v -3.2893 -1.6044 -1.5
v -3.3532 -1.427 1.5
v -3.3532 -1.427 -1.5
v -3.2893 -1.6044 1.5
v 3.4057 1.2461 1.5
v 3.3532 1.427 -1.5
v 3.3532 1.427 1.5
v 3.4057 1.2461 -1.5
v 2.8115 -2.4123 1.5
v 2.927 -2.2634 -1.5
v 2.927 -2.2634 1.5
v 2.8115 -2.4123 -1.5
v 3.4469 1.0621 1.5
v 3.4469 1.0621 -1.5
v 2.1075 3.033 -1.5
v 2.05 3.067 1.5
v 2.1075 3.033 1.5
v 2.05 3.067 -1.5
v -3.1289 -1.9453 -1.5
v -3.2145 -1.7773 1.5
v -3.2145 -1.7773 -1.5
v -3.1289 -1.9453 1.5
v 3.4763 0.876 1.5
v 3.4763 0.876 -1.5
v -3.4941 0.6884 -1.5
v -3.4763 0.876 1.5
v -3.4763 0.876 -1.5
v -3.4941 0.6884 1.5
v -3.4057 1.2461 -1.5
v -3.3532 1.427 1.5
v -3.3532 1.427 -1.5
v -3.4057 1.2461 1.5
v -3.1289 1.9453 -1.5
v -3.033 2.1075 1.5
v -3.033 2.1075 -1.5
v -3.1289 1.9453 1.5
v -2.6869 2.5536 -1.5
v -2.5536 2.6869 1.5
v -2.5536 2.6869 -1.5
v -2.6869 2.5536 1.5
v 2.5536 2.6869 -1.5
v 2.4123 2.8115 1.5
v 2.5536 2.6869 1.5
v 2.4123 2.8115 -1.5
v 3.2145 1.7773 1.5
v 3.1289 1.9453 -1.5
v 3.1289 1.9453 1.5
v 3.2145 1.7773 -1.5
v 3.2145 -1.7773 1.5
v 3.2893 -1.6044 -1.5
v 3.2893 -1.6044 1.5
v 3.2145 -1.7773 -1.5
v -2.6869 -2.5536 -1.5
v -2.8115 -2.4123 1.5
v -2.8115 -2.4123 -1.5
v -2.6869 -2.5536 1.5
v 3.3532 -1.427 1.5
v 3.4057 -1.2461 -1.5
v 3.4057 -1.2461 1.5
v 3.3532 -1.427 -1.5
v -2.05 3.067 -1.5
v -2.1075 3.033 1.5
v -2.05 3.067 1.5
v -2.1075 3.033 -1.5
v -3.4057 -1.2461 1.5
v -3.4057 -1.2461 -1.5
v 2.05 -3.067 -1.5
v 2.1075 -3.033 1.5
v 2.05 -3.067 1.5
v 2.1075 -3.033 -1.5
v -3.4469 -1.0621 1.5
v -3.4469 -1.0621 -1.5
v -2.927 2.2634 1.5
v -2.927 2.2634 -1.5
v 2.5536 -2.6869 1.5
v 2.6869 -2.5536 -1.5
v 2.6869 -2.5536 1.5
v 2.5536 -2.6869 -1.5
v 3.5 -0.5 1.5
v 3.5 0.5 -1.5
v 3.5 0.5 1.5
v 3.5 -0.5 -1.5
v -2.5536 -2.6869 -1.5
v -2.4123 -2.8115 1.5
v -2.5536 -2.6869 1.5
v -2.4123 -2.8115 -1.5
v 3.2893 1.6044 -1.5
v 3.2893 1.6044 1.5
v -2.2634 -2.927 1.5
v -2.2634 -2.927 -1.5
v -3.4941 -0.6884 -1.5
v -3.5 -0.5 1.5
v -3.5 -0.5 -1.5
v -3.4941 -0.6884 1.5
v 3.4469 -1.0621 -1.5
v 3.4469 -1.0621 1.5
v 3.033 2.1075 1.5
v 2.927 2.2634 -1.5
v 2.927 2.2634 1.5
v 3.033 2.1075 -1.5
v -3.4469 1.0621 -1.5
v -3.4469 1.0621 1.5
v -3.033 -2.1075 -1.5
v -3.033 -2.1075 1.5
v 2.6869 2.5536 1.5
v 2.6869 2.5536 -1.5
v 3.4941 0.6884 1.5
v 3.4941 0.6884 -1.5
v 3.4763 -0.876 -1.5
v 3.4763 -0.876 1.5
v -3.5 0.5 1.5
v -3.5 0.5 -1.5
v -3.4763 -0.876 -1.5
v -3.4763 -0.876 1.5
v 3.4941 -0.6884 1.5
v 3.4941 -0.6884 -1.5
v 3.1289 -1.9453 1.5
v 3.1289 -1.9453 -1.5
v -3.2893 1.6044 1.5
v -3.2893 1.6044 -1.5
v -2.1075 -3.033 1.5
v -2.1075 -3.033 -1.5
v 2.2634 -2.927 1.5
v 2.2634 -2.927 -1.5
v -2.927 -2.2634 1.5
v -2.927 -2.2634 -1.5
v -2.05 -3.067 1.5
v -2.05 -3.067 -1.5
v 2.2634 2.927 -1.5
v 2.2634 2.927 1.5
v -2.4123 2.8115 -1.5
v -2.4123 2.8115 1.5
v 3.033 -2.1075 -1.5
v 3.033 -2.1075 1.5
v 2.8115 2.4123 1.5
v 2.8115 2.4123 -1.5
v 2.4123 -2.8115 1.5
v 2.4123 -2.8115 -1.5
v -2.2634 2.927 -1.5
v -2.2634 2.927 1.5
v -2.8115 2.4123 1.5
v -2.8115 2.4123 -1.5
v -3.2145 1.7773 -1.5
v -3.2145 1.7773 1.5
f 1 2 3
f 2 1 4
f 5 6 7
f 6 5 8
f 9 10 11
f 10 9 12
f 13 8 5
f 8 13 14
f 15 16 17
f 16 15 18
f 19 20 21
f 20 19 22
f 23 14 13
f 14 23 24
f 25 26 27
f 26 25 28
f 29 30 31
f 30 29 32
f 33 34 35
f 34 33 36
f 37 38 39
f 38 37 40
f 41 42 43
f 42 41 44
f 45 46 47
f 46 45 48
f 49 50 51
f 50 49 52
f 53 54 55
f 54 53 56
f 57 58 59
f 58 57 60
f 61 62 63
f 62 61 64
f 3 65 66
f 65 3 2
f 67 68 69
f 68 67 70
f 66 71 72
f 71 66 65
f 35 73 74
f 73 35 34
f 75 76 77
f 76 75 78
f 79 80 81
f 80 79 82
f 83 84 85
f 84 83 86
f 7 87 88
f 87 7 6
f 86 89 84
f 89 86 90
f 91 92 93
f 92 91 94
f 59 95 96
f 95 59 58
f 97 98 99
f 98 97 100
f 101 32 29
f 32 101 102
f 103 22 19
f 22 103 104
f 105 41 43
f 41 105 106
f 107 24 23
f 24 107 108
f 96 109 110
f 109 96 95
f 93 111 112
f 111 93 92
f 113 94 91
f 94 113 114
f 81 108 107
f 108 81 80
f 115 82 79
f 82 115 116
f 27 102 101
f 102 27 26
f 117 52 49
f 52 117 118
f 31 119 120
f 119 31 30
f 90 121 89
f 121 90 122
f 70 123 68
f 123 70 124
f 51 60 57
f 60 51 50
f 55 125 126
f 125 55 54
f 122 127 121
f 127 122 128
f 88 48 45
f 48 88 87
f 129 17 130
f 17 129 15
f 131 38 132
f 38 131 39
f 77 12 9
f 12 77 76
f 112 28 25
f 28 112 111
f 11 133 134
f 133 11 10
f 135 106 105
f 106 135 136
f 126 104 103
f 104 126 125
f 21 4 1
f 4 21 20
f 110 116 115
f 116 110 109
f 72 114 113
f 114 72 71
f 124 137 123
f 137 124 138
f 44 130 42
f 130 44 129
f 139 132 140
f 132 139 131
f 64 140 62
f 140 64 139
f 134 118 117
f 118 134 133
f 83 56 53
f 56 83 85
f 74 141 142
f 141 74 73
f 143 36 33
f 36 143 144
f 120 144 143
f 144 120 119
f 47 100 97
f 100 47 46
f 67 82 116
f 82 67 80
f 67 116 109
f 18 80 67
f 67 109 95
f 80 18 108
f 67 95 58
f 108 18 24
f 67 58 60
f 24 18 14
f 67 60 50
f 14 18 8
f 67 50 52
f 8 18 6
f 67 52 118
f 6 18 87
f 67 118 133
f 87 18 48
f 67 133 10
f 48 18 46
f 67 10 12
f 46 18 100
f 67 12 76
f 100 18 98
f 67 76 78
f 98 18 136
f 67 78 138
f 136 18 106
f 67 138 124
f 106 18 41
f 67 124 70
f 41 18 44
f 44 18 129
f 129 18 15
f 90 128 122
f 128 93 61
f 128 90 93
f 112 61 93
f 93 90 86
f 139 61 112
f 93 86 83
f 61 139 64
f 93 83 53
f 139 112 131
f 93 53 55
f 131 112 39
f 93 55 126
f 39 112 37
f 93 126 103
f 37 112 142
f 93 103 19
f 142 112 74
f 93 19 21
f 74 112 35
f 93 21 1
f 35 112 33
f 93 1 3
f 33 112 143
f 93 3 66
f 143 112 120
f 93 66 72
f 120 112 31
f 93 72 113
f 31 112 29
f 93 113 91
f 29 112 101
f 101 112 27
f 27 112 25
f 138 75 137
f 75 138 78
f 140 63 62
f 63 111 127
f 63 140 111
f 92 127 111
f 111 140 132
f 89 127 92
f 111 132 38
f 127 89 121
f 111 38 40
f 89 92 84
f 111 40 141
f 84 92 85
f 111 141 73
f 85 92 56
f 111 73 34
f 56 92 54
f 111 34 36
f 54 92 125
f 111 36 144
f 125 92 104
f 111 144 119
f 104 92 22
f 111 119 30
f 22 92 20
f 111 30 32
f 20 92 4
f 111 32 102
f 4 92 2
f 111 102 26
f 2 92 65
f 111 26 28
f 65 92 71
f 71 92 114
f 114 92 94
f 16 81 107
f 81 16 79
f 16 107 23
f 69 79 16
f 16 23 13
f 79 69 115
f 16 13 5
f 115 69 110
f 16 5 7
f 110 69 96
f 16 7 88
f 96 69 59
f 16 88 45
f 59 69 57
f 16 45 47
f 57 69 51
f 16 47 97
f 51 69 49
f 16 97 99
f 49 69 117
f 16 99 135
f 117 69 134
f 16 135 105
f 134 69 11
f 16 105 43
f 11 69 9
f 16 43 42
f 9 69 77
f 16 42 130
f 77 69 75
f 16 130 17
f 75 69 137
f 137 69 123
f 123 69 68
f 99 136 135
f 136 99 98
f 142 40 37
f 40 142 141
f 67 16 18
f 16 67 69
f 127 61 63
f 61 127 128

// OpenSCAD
/*

OpenSCAD-File to generate a Customized luggage label
2013-10-19 - kowomike

Needs write.scad as found here:
https://github.com/rohieb/Write.scad

or here:
http://www.thingiverse.com/thing:16193

Uses font for write.scad as found here:
http://www.thingiverse.com/thing:100779

*/

use <Module/Writescad/write.scad>  //Change to directory where write.scad resides; Put the font (stencil2.dxf) in same directory (were other fonts are as well)

//Other fonts need heavy changes for spacing, size etc.
font="stencil2.dxf";
fontlengthfactor=.682;

// **** START CUSTOMIZING HERE ****

// Fontheight of text (too small will be hard to print)
fontsize=11;

// Spacing between letters (too little will be hard to print)
spacing=0.9;		 

// Spacing between lines as factor of fontsize
linespacing=0.85;	 

// Corner radius of plate [mm]
cornerradius=3;   

// Thickness of plate [mm]
platethickness=3; 

// emgraving depth of text in % of plate (-66 is nice; -100 is through-hole)
// Use positive values to emboss instead of engraving 
textdepth=-66;      

// Length of slitted hole [mm]
slitlength=10;		 

// Width of slitted hole [mm]
slitwidth=4;		 

// Put text inside the plate so it can only be seen against light; sets textdepth automatically to 50%; !! You won't see text in preview anymore so first be sure to have it right
hidetext=false;    

// Enter Text; UPPERCASE looks best
// Use up to 10 lines as needed; for alignment to center or right, use spaces

text=[				 
"YOUR NAME",
"ADDRESS",
"ZIP CITY",
"COUNTRY"

];						  

// **** END CUSTOMIZING HERE ****

//Find out maximum characters for first 10 lines for centering
maxtextchars = max(len(text[0]),len(text[1]),len(text[2]),len(text[3]),len(text[4]),len(text[5]),len(text[6]),len(text[7]),len(text[8]),len(text[9]));
textlines=len(text);

//Calculate Platesize based on textlength and fontsize
textlength=maxtextchars*spacing*fontlengthfactor*fontsize;
platelength=textlength+slitwidth+fontlengthfactor*fontsize/2+6+sqrt(cornerradius); //+slitwidth-sqrt(corner_radius)+6;
platewidth=textlines*0.9*fontsize+cornerradius/2;

//Avoid having slit larger than platewidth
slitlengthuse=min(slitlength,(platewidth-cornerradius*2)*0.9);

//Change text depth and text height when hidden is true
textdepthuse=((hidetext==true)? -platethickness*1/4 : 0.01);
textthickness=((hidetext==true)? -platethickness/2 : textdepth/100*platethickness-0.02);

//Module for plate
module plate (length,width,thickness,cornerradius) {
linear_extrude(height = thickness, center = true, convexity = 10) {
	minkowski () {
	square ([length-2*cornerradius,width-2*cornerradius],center=true);
	circle (r=max(0.1,cornerradius),$fn=100);  //Max-function to avoid malfunction with cornerradius 0
	}
}
}


//Module for slit
module slit (slitlength,slitwidth,slitheight) { 
linear_extrude(height = slitheight+1, center = true, convexity = 10) {
	minkowski () {
	square ([0.1,slitlength],center=true);
	circle (r=slitwidth/2,$fn=100);
	}
}
}


//Generate complete plate
difference () {
	plate(platelength,platewidth,platethickness,cornerradius);

	//Slit for attaching
	translate ([-platelength/2+4+slitwidth/2,0,0])
	slit(slitlengthuse,slitwidth,platethickness);

	//Engrave text if textdepth negative
	if (textdepth<0) {
		translate ([fontlengthfactor*fontsize/2,-fontsize*0.75,platethickness/2])  //Adjust text start 
		translate ([-textlength/2+2+slitwidth/2,textlines*linespacing*fontsize/2,textdepthuse])
		for (i=[0:textlines-1]) {
			translate ([0,-fontsize*linespacing*i,0])
			#write(text[i],t=textthickness,h=fontsize,font=font,space=spacing);
		};
	}

//Uncomment to show inside of plate for checking hidden text position
//translate ([0,0,-50])
//cube ([100,100,100]);

}

//Emboss text if textdepth positive
if (textdepth>0) {  
		color ("YellowGreen")
		translate ([fontlengthfactor*fontsize/2,-fontsize*0.75,platethickness/2])  //Adjust text start 
		translate ([-textlength/2+2+slitwidth/2,textlines*linespacing*fontsize/2,0])
		for (i=[0:textlines-1]) {
			translate ([0,-fontsize*linespacing*i,0])
			write(text[i],t=textthickness,h=fontsize,font=font,space=spacing);
		};
}
